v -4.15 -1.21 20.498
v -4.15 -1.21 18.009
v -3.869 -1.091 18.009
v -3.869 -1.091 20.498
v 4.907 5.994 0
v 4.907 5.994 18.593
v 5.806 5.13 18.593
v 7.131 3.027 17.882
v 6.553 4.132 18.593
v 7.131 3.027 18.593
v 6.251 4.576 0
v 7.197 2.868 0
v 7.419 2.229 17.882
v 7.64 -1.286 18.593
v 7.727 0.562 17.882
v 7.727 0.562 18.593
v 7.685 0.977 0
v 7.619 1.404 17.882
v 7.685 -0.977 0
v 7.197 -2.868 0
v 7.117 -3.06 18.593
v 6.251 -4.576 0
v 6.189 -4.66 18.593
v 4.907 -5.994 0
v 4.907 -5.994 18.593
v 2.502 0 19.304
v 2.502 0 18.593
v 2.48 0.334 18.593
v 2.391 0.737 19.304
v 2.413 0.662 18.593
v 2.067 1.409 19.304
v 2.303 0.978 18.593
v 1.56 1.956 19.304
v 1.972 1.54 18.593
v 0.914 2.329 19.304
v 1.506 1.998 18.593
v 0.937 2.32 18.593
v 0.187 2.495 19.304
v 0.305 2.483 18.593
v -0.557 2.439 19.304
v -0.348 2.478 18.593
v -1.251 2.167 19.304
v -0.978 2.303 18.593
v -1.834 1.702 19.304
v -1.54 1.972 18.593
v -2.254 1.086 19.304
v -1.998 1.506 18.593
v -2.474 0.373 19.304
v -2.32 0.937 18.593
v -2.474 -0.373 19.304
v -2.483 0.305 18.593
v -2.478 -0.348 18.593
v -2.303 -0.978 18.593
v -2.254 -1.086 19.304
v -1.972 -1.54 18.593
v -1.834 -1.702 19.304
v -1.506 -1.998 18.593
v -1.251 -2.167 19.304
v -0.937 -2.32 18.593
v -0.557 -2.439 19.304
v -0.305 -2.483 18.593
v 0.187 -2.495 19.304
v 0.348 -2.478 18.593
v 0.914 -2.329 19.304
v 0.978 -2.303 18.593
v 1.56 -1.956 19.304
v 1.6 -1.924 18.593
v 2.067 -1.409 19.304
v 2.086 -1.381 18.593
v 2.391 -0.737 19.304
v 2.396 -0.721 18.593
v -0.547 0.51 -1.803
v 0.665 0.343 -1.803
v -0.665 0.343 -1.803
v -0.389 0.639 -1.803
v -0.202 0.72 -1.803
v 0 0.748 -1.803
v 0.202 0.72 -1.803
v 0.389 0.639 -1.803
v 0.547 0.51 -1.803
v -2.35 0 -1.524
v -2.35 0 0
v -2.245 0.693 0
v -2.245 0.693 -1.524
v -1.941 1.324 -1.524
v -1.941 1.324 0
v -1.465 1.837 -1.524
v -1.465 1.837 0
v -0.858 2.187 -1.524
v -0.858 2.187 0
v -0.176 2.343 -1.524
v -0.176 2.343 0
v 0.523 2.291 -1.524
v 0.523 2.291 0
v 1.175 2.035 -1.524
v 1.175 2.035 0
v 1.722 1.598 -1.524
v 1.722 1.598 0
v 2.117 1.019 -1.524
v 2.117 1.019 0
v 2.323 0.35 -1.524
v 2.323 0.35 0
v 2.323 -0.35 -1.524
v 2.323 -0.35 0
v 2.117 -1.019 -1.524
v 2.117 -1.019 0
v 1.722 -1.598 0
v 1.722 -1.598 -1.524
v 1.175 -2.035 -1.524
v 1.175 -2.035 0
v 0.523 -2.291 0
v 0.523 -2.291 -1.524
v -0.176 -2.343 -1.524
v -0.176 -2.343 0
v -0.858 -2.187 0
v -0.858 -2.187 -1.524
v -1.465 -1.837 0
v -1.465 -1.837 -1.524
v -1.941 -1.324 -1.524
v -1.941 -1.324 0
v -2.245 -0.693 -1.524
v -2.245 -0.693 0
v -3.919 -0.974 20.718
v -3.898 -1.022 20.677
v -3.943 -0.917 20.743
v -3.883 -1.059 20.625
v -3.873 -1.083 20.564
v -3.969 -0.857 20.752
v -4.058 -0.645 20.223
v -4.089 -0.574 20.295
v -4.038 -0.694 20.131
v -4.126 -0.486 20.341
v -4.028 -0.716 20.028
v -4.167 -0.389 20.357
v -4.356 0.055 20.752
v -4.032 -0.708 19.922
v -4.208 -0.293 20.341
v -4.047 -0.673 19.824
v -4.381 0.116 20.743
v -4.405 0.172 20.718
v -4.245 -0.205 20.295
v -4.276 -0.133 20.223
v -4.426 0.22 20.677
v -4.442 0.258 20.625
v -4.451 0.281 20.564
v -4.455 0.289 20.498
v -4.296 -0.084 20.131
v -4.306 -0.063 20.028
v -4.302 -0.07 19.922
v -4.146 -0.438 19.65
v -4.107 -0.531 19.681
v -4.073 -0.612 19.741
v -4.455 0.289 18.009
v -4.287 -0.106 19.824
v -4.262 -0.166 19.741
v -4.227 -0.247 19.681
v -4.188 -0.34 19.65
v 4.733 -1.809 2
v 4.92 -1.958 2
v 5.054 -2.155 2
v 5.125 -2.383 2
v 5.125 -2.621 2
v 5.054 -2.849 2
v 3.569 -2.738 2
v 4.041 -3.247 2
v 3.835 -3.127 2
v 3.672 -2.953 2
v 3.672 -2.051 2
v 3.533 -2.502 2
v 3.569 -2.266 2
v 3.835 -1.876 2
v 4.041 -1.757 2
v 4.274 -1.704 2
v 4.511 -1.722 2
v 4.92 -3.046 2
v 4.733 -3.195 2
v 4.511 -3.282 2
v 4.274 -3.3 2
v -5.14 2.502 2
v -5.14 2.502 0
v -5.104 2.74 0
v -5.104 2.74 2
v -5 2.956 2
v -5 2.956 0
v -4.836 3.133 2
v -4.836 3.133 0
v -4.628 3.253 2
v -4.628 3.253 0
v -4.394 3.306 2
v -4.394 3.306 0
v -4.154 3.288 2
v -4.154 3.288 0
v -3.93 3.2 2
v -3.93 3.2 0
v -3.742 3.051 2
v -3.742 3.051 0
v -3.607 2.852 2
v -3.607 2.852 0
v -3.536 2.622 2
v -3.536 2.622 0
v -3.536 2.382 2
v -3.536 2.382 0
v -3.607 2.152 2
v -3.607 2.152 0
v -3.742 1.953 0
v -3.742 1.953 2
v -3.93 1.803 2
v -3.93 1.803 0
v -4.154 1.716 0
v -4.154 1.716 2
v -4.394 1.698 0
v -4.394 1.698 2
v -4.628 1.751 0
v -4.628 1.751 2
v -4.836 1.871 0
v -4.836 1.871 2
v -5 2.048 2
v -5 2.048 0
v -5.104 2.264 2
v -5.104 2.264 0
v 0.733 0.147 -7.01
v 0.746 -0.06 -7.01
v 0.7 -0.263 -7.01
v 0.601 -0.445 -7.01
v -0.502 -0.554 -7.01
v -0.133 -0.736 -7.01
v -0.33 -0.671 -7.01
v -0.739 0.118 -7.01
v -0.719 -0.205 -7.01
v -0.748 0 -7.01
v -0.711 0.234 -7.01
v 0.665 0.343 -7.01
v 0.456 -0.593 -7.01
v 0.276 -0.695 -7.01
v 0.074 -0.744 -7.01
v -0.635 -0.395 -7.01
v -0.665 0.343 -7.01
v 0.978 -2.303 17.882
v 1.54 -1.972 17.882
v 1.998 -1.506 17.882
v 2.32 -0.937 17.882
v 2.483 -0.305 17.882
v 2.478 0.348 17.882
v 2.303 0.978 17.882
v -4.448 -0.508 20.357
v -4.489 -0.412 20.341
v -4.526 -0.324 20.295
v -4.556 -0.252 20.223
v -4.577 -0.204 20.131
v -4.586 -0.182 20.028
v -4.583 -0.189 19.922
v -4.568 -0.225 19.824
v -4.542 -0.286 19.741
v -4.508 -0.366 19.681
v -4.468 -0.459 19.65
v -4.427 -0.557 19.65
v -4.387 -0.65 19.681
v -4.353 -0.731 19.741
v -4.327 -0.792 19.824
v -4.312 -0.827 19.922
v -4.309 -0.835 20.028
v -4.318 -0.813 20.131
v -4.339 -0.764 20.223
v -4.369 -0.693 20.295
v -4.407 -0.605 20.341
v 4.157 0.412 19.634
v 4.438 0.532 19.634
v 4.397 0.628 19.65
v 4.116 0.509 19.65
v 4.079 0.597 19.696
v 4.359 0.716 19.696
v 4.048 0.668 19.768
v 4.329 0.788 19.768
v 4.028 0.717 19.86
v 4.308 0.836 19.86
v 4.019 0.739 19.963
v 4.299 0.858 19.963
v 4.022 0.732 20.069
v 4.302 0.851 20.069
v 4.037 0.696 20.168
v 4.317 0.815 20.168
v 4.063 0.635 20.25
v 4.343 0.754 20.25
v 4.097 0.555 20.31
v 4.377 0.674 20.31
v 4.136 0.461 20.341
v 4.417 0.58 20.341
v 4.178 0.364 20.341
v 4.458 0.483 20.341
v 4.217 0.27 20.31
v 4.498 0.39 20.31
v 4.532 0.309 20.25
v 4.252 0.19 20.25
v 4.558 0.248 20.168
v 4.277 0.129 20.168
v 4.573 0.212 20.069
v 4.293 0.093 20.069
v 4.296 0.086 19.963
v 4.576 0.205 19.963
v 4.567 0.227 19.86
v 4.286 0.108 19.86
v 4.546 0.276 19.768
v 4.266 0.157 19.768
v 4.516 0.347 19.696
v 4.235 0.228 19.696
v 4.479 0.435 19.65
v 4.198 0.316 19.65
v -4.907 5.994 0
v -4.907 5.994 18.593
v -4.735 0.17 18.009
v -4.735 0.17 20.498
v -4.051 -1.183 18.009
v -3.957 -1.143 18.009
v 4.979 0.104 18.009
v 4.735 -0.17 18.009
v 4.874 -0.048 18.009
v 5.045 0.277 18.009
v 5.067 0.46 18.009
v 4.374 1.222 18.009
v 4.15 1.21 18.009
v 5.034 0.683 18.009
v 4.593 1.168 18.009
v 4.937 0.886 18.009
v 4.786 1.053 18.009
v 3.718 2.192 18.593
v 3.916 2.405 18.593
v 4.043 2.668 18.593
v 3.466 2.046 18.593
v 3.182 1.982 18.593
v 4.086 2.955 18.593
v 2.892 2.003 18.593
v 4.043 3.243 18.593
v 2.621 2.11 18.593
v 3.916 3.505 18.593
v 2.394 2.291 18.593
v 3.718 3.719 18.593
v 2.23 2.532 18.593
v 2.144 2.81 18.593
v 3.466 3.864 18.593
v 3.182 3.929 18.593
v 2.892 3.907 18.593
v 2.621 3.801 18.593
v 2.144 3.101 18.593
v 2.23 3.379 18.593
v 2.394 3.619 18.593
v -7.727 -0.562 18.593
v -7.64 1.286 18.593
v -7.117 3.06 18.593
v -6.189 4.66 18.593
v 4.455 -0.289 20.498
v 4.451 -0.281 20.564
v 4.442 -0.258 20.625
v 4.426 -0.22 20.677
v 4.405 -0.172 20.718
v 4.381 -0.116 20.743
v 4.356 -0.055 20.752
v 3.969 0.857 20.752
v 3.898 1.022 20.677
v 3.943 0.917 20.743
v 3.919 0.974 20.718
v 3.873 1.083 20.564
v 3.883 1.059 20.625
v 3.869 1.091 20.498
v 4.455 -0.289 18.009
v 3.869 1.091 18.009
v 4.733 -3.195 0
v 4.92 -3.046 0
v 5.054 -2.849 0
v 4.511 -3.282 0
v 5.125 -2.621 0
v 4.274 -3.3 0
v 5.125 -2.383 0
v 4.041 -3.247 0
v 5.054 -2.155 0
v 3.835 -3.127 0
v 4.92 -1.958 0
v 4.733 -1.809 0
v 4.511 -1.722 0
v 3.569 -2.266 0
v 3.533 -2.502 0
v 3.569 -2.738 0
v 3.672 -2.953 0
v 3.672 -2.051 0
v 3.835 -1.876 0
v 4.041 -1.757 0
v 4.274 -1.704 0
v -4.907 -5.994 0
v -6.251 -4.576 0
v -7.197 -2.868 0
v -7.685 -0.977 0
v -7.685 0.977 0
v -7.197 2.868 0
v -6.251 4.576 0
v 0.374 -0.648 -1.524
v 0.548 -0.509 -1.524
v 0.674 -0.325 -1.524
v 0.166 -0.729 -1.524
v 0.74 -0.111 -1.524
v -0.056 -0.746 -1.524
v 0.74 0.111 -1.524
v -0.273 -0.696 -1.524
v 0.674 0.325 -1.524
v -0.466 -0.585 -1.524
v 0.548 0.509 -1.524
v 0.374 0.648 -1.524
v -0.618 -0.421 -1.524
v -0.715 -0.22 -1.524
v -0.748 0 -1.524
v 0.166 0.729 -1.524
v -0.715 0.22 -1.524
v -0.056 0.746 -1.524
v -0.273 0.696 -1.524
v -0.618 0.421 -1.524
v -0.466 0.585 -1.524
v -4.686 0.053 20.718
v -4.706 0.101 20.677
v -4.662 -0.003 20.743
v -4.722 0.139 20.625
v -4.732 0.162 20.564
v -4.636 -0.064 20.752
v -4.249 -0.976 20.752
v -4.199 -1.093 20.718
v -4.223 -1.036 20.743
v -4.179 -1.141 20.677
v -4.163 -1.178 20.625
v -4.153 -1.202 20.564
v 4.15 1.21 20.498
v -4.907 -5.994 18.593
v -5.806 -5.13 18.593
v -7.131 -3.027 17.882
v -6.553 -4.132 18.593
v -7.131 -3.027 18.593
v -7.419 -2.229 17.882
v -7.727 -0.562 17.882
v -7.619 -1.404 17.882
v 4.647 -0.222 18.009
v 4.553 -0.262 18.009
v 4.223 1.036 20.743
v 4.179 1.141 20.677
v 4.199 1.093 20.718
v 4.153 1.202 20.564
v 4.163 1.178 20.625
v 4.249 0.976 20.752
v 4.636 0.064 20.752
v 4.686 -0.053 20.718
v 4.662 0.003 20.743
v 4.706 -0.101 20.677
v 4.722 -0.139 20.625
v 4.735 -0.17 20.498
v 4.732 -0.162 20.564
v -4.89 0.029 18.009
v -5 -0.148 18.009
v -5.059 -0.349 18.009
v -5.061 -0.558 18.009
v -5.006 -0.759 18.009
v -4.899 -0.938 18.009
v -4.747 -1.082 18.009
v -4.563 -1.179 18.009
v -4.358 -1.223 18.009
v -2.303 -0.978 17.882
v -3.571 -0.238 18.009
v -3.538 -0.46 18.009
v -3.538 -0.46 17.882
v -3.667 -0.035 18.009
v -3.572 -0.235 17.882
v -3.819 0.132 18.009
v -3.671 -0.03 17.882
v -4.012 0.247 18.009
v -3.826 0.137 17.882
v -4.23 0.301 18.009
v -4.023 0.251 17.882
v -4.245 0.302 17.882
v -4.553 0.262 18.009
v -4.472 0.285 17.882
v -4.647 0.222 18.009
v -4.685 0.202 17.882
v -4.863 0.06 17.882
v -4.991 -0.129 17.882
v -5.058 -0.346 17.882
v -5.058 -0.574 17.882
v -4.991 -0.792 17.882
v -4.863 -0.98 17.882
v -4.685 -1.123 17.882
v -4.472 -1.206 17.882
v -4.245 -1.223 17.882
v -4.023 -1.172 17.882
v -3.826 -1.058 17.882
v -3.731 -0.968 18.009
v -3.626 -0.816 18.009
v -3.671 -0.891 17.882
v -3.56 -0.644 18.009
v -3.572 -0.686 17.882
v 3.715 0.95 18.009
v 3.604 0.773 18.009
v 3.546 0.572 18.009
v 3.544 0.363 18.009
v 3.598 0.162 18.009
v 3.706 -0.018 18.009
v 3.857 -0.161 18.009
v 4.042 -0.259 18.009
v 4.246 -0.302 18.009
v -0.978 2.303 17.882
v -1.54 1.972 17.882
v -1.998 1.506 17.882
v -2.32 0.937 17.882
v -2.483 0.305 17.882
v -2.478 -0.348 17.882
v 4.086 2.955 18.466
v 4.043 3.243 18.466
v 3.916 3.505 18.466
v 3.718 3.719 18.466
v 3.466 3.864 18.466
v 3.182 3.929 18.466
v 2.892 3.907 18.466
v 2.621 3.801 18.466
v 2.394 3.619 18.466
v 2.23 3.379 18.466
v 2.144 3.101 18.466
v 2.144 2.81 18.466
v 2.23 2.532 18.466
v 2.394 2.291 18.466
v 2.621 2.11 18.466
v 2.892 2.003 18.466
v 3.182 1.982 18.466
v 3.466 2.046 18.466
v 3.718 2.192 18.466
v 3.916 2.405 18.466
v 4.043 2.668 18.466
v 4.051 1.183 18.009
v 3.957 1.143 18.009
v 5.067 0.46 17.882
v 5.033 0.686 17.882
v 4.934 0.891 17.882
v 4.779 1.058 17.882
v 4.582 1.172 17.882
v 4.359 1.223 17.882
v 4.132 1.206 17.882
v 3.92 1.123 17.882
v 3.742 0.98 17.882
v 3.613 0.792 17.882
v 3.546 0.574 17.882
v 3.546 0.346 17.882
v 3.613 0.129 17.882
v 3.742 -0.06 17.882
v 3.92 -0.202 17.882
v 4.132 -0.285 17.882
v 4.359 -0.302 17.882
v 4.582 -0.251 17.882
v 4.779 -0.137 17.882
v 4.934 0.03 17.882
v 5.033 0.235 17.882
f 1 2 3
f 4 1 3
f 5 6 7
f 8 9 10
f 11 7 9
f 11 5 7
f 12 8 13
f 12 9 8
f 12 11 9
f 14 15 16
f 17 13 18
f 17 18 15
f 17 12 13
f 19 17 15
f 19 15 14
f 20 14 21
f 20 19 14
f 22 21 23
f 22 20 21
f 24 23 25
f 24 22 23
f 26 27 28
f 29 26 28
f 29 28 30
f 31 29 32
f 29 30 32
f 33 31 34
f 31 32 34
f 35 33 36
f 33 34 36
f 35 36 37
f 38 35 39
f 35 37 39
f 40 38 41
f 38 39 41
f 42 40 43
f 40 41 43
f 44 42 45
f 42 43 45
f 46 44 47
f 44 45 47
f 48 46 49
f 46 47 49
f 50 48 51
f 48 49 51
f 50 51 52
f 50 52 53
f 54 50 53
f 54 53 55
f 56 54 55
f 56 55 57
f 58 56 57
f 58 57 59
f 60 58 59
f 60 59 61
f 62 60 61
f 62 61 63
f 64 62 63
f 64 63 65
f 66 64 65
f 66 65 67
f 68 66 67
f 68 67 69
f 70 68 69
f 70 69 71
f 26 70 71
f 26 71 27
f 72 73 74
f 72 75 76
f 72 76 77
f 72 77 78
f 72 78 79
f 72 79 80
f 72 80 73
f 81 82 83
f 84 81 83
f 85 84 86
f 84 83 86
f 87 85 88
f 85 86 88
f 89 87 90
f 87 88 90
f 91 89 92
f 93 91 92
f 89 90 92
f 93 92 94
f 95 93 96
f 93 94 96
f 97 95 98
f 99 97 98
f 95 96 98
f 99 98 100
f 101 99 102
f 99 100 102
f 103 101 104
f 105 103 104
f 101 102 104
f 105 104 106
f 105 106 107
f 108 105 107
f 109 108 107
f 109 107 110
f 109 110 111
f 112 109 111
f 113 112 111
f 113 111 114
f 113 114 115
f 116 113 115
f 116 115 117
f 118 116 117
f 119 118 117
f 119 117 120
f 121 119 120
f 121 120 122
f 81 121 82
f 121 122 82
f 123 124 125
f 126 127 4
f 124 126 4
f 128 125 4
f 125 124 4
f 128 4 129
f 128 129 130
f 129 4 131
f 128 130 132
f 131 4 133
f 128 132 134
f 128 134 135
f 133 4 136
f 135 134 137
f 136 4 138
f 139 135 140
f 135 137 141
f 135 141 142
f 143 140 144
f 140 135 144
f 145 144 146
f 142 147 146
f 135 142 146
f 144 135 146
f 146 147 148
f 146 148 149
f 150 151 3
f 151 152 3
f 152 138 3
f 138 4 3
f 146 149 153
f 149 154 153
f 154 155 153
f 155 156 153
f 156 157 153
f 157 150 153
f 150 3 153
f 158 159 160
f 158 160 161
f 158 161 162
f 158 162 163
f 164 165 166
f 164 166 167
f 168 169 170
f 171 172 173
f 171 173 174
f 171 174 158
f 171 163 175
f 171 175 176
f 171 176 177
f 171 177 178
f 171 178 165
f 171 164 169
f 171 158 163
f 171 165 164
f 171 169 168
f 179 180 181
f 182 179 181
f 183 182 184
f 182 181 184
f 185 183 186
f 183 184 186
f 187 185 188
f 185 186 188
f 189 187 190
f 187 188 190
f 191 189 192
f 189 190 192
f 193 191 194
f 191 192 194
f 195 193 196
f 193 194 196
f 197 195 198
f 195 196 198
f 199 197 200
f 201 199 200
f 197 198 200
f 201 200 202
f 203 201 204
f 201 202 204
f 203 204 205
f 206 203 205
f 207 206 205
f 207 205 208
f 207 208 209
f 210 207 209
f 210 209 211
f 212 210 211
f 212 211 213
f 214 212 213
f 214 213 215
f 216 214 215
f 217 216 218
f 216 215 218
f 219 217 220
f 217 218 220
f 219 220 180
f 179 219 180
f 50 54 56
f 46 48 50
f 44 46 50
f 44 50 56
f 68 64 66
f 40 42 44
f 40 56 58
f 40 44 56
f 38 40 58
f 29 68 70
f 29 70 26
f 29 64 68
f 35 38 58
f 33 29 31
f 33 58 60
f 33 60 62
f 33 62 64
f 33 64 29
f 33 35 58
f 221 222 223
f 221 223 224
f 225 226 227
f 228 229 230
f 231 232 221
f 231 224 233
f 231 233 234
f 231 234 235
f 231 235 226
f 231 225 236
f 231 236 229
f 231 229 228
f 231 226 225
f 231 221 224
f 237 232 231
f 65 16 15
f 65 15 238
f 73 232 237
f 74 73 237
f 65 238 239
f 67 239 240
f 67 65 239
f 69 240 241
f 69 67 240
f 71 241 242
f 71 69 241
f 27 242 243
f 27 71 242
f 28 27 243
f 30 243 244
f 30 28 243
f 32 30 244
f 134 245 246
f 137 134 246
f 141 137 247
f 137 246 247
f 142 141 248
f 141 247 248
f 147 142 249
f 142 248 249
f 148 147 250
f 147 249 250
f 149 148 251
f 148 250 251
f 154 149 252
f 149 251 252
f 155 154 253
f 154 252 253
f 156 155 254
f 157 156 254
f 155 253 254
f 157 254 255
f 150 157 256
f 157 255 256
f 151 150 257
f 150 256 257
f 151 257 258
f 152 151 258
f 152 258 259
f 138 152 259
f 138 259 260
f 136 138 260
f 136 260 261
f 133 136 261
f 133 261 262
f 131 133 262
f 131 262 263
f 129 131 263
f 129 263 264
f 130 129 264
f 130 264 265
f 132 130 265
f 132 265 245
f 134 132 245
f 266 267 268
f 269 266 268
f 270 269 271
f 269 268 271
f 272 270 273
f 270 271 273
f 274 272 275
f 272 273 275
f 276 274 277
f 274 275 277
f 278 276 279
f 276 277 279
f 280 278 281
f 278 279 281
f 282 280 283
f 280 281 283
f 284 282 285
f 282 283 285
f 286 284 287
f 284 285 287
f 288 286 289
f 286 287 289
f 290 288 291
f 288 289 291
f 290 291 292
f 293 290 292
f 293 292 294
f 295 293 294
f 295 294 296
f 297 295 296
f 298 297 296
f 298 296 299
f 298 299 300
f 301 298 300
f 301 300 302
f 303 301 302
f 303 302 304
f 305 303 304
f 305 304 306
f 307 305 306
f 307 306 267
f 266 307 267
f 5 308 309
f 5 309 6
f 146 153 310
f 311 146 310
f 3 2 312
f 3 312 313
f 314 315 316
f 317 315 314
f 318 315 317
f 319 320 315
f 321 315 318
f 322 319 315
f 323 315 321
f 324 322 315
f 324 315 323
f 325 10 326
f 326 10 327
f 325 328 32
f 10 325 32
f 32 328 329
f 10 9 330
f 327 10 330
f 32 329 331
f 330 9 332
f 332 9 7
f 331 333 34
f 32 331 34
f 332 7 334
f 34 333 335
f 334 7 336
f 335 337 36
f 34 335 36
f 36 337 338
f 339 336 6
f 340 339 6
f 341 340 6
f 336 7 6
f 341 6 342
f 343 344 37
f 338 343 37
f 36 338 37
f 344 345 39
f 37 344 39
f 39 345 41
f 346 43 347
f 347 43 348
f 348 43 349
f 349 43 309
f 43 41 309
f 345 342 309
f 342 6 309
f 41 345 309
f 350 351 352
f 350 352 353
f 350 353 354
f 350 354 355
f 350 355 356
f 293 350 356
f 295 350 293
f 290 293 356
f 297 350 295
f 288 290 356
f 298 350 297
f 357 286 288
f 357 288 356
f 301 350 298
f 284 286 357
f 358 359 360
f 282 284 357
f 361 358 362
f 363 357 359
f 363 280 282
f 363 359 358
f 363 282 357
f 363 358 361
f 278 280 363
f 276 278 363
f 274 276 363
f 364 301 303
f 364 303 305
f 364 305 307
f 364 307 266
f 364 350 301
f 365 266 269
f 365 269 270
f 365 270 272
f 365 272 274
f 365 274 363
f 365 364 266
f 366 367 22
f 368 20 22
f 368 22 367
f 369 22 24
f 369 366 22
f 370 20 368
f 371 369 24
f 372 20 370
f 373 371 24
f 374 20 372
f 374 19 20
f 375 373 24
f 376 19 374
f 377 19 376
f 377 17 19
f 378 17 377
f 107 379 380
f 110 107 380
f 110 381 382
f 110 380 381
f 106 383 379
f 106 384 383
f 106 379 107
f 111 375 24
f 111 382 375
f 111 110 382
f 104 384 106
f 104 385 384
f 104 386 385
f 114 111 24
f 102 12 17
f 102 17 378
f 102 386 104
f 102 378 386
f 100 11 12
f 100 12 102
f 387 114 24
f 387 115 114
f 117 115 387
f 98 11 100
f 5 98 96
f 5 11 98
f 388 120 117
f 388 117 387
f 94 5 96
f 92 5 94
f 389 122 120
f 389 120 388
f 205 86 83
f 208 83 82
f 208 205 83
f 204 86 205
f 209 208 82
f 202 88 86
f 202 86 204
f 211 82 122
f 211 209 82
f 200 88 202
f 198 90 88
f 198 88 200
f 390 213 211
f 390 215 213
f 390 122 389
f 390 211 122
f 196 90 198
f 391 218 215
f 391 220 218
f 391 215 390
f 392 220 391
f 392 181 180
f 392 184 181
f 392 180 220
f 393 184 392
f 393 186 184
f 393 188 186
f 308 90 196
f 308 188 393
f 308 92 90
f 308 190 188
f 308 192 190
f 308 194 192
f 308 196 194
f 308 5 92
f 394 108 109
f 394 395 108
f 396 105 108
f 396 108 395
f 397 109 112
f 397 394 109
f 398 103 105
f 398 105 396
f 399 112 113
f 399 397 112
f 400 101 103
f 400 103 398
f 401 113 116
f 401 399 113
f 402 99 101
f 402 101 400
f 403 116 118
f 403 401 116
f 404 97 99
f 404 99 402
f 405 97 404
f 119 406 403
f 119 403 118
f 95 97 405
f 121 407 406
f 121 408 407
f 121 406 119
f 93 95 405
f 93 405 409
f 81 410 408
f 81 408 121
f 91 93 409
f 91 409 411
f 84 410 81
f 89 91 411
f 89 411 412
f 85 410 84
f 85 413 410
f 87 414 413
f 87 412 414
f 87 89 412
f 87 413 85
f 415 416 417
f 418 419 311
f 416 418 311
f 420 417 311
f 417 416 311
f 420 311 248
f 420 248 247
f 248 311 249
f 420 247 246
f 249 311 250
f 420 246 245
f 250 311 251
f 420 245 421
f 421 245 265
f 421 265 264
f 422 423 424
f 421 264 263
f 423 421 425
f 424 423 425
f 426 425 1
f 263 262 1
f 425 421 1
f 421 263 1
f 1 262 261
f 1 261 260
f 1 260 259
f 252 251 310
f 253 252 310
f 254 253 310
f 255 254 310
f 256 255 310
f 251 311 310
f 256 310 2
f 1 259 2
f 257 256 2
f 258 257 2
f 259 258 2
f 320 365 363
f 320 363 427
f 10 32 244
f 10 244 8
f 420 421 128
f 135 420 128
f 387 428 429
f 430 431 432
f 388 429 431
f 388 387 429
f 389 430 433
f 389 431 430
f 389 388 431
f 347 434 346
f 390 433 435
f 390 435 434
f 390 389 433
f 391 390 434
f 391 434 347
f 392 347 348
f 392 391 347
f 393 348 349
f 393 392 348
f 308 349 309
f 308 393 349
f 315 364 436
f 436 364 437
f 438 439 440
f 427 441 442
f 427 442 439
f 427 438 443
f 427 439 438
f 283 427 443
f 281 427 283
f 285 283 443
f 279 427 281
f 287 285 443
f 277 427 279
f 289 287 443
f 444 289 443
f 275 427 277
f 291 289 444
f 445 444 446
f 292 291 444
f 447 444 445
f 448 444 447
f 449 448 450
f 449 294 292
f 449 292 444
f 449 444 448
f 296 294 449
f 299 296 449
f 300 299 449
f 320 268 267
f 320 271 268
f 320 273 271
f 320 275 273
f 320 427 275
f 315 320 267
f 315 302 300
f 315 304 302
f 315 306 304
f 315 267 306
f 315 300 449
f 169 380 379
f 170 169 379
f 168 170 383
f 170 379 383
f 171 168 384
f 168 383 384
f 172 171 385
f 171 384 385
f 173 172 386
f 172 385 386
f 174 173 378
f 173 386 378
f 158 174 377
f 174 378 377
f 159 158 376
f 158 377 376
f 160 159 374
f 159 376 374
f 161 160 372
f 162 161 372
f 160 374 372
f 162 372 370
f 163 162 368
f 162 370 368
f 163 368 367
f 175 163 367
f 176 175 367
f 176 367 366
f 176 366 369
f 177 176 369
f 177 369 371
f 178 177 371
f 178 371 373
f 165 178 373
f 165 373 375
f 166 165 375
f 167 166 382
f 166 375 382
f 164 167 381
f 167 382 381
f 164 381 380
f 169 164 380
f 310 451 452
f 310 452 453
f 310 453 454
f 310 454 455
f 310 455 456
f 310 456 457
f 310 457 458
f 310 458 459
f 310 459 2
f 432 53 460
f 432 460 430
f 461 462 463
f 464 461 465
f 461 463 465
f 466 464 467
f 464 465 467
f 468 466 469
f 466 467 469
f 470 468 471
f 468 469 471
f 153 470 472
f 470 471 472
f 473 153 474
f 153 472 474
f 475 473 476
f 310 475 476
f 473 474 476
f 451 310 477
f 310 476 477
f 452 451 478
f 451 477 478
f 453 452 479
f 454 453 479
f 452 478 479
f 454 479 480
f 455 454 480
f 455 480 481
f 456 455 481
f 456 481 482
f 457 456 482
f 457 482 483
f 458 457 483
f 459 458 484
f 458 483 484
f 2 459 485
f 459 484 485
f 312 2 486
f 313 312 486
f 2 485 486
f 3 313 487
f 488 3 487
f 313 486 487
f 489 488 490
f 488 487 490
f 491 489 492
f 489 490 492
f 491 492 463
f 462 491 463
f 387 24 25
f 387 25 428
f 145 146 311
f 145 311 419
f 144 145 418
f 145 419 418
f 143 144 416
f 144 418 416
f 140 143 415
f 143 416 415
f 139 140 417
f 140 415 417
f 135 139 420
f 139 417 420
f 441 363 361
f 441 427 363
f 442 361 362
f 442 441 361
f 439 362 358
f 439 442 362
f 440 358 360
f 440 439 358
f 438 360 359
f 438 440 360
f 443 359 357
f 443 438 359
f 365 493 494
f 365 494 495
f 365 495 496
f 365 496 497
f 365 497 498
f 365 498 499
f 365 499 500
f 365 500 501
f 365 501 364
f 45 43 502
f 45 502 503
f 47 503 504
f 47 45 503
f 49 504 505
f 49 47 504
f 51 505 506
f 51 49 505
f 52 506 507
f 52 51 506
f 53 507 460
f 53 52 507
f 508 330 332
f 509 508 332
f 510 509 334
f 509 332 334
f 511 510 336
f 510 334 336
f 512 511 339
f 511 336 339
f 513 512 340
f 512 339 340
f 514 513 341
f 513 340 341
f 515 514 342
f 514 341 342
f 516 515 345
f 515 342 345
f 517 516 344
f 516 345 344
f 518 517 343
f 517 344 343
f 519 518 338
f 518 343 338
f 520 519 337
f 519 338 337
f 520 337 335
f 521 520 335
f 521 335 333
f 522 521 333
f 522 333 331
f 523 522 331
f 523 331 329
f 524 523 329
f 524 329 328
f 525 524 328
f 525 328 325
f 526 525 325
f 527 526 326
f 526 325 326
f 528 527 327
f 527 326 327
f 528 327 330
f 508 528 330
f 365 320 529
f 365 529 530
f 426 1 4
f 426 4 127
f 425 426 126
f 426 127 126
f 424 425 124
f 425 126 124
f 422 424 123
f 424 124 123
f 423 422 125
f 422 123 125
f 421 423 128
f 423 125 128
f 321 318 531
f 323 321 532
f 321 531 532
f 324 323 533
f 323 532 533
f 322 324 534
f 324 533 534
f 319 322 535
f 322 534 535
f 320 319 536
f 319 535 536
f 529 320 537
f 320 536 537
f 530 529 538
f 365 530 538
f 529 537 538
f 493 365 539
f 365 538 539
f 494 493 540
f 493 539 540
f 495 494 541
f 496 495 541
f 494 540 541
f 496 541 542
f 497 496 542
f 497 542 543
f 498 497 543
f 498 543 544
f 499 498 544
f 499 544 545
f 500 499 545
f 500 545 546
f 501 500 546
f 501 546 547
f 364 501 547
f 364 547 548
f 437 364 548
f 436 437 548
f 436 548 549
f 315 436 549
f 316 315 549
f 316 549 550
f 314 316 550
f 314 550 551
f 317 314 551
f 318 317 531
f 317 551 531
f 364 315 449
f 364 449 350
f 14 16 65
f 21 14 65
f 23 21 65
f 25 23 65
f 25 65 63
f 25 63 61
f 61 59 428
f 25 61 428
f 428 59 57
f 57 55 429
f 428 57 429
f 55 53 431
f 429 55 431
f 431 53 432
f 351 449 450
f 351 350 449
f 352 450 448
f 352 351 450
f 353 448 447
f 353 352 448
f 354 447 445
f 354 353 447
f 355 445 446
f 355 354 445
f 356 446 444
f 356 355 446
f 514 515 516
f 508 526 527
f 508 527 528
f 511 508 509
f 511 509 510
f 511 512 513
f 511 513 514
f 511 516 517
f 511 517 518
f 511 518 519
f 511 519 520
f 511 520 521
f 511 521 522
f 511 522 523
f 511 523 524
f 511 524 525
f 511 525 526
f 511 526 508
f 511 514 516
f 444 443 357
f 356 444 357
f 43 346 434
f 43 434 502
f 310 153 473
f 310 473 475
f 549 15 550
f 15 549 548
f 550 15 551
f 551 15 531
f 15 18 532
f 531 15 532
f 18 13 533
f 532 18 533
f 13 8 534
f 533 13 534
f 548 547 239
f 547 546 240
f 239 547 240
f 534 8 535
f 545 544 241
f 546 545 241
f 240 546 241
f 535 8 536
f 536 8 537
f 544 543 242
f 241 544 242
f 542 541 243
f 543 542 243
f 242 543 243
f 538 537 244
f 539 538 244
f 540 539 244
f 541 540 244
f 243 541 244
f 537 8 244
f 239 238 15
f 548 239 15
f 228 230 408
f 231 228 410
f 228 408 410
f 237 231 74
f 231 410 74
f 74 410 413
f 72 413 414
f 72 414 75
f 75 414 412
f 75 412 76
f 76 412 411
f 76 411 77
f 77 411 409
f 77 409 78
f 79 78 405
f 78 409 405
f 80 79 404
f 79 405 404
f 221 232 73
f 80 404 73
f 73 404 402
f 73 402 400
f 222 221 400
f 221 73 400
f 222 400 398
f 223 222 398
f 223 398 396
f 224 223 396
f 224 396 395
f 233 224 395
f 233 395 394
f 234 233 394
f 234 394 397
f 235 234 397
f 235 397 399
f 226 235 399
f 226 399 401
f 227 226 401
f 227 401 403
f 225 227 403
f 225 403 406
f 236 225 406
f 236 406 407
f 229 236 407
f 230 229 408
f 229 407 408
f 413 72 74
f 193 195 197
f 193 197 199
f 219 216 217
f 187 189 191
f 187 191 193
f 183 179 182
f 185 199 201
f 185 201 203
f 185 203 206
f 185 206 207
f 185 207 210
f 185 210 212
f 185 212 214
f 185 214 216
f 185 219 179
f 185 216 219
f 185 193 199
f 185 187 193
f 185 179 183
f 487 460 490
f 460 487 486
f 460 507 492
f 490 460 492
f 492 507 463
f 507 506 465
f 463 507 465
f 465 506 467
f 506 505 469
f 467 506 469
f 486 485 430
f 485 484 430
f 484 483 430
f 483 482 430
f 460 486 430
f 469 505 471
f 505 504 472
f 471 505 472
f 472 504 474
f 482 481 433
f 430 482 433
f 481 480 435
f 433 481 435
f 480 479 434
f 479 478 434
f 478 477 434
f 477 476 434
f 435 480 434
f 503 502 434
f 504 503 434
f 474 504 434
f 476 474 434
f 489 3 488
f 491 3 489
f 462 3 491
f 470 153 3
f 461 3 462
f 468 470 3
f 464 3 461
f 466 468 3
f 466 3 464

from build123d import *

# Parameters (mm, degrees)
EXTRUDE1_DEPTH     = 18.5928
SKETCH2_R          = 2.3495
EXTRUDE2_DEPTH     = 1.524
SKETCH3_R          = 0.74803
EXTRUDE3_DEPTH     = 5.4864
SKETCH4_R          = 2.5019
EXTRUDE4_DEPTH     = 0.7112
SKETCH6_R          = 0.806604734
SKETCH6_R_2        = 0.8001
CUT_EXTRUDE1_DEPTH = 2
CUT_EXTRUDE2_DEPTH = 0.7112
CUT_EXTRUDE3_DEPTH = 0.7112
EXTRUDE5_DEPTH     = 2.8702
FILLET1_R          = 0.254
SKETCH11_R         = 0.3556
CUT_EXTRUDE4_DEPTH = 0.381
SKETCH12_R         = 0.3556
CUT_EXTRUDE5_DEPTH = 0.381
SKETCH13_R         = 0.764641256
EXTRUDE6_DEPTH     = 0.127
SKETCH14_R         = 0.976393175
EXTRUDE7_DEPTH     = 0.127
EXTRUDE8_DEPTH     = 5.207


with BuildPart() as part:
    # Sketch1 → Extrude1 (new body)
    with BuildSketch(Plane.XY):
        with BuildLine():
            Line((-4.907461425, 5.9944), (4.907461425, 5.9944))
            ThreePointArc((4.907461425, 5.9944), (7.747, 0), (4.907461425, -5.9944))
            Line((4.907461425, -5.9944), (-4.907461425, -5.9944))
            ThreePointArc((-4.907461425, -5.9944), (-7.747, 0), (-4.907461425, 5.9944))
        make_face()
    extrude(amount=EXTRUDE1_DEPTH)

    # Sketch2 → Extrude2 (add)
    with BuildSketch(Plane(origin=(0, 0, 0), x_dir=(-1, 0, 0), z_dir=(0, 0, -1))):
        Circle(SKETCH2_R)
    extrude(amount=EXTRUDE2_DEPTH)

    # Sketch3 → Extrude3 (add)
    with BuildSketch(Plane(origin=(0, 0, -1.524), x_dir=(-1, 0, 0), z_dir=(0, 0, -1))):
        Circle(SKETCH3_R)
    extrude(amount=EXTRUDE3_DEPTH)

    # Sketch4 → Extrude4 (add)
    with BuildSketch(Plane.XY.offset(18.5928)):
        Circle(SKETCH4_R)
    extrude(amount=EXTRUDE4_DEPTH)

    # Sketch6 → Cut-Extrude1 (cut)
    with BuildSketch(Plane(origin=(0, 0, 0), x_dir=(-1, 0, 0), z_dir=(0, 0, -1))):
        with Locations((4.333417915, 2.5019)):
            Circle(SKETCH6_R)
        with Locations((-4.333417915, -2.5019)):
            Circle(SKETCH6_R_2)
    extrude(amount=-CUT_EXTRUDE1_DEPTH, mode=Mode.SUBTRACT)

    # Sketch8 → Cut-Extrude2 (cut)
    with BuildSketch(Plane.XY.offset(18.5928)):
        with BuildLine():
            Line((2.303011093, 0.97757021), (7.222442902, 3.065745123))
            Line((7.222442902, 3.065745123), (8.200013112, 0.76273403))
            Line((8.200013112, 0.76273403), (0.97757021, -2.303011093))
            ThreePointArc((0.97757021, -2.303011093), (2.319721286, -0.937228236), (2.303011093, 0.97757021))
        make_face()
    extrude(amount=-CUT_EXTRUDE2_DEPTH, mode=Mode.SUBTRACT)

    # Sketch9 → Cut-Extrude3 (cut)
    with BuildSketch(Plane.XY.offset(18.5928)):
        with BuildLine():
            Line((-2.303011093, -0.97757021), (-8.41785865, -3.573169003))
            Line((-8.41785865, -3.573169003), (-9.39542886, -1.27015791))
            Line((-9.39542886, -1.27015791), (-0.97757021, 2.303011093))
            ThreePointArc((-0.97757021, 2.303011093), (-2.319721286, 0.937228236), (-2.303011093, -0.97757021))
        make_face()
    extrude(amount=-CUT_EXTRUDE3_DEPTH, mode=Mode.SUBTRACT)

    # Sketch10 → Extrude5 (add)
    with BuildSketch(Plane.XY.offset(17.8816)):
        Polygon((-4.735400216, 0.169832597), (-4.149850547, -1.209635977), (-3.869280668, -1.090541129), (-4.454830337, 0.288927445), align=None)
        Polygon((3.869280668, 1.090541129), (4.149850547, 1.209635977), (4.735400216, -0.169832597), (4.454830337, -0.288927445), align=None)
    extrude(amount=EXTRUDE5_DEPTH)

    # Fillet1
    fillet1_edges = [part.edges().sort_by_distance(p)[0] for p in [
        (-4.595115277, 0.229380021, 20.7518),
        (-4.009565608, -1.150088553, 20.7518),
        (4.595115277, -0.229380021, 20.7518),
        (4.009565608, 1.150088553, 20.7518),
    ]]
    fillet(fillet1_edges, radius=FILLET1_R)

    # Sketch11 → Cut-Extrude4 (cut)
    with BuildSketch(Plane(origin=(-3.951359134, -1.677252442, 0), x_dir=(0, 0, 1), z_dir=(-0.920504853, -0.390731128, 0))):
        with Locations((20.001394918, 1.27)):
            Circle(SKETCH11_R)
    extrude(amount=-CUT_EXTRUDE4_DEPTH, mode=Mode.SUBTRACT)

    # Sketch12 → Cut-Extrude5 (cut)
    with BuildSketch(Plane(origin=(3.951359134, 1.677252442, 0), x_dir=(0, 0, -1), z_dir=(0.920504853, 0.390731128, 0))):
        with Locations((-19.9898, -1.2446)):
            Circle(SKETCH12_R)
    extrude(amount=-CUT_EXTRUDE5_DEPTH, mode=Mode.SUBTRACT)

    # Sketch13 → Extrude6 (add)
    with BuildSketch(Plane.XY.offset(17.8816)):
        with Locations((4.302340442, 0.460354266)):
            Circle(SKETCH13_R)
        with Locations((-4.302340442, -0.460354266)):
            Circle(SKETCH13_R)
    extrude(amount=EXTRUDE6_DEPTH)

    # Sketch14 → Extrude7 (cut)
    with BuildSketch(Plane.XY.offset(18.5928)):
        with Locations((3.109494983, 2.955380071)):
            Circle(SKETCH14_R)
    extrude(amount=-EXTRUDE7_DEPTH, mode=Mode.SUBTRACT)

    # Sketch15 → Extrude8 (cut)
    with BuildSketch(Plane(origin=(0, 0, -7.0104), x_dir=(-1, 0, 0), z_dir=(0, 0, -1))):
        with BuildLine():
            Line((-0.664807093, 0.3429), (0.664807093, 0.3429))
            ThreePointArc((0.664807093, 0.3429), (0, 0.74803), (-0.664807093, 0.3429))
        make_face()
    extrude(amount=-EXTRUDE8_DEPTH, mode=Mode.SUBTRACT)


solid = part.part
